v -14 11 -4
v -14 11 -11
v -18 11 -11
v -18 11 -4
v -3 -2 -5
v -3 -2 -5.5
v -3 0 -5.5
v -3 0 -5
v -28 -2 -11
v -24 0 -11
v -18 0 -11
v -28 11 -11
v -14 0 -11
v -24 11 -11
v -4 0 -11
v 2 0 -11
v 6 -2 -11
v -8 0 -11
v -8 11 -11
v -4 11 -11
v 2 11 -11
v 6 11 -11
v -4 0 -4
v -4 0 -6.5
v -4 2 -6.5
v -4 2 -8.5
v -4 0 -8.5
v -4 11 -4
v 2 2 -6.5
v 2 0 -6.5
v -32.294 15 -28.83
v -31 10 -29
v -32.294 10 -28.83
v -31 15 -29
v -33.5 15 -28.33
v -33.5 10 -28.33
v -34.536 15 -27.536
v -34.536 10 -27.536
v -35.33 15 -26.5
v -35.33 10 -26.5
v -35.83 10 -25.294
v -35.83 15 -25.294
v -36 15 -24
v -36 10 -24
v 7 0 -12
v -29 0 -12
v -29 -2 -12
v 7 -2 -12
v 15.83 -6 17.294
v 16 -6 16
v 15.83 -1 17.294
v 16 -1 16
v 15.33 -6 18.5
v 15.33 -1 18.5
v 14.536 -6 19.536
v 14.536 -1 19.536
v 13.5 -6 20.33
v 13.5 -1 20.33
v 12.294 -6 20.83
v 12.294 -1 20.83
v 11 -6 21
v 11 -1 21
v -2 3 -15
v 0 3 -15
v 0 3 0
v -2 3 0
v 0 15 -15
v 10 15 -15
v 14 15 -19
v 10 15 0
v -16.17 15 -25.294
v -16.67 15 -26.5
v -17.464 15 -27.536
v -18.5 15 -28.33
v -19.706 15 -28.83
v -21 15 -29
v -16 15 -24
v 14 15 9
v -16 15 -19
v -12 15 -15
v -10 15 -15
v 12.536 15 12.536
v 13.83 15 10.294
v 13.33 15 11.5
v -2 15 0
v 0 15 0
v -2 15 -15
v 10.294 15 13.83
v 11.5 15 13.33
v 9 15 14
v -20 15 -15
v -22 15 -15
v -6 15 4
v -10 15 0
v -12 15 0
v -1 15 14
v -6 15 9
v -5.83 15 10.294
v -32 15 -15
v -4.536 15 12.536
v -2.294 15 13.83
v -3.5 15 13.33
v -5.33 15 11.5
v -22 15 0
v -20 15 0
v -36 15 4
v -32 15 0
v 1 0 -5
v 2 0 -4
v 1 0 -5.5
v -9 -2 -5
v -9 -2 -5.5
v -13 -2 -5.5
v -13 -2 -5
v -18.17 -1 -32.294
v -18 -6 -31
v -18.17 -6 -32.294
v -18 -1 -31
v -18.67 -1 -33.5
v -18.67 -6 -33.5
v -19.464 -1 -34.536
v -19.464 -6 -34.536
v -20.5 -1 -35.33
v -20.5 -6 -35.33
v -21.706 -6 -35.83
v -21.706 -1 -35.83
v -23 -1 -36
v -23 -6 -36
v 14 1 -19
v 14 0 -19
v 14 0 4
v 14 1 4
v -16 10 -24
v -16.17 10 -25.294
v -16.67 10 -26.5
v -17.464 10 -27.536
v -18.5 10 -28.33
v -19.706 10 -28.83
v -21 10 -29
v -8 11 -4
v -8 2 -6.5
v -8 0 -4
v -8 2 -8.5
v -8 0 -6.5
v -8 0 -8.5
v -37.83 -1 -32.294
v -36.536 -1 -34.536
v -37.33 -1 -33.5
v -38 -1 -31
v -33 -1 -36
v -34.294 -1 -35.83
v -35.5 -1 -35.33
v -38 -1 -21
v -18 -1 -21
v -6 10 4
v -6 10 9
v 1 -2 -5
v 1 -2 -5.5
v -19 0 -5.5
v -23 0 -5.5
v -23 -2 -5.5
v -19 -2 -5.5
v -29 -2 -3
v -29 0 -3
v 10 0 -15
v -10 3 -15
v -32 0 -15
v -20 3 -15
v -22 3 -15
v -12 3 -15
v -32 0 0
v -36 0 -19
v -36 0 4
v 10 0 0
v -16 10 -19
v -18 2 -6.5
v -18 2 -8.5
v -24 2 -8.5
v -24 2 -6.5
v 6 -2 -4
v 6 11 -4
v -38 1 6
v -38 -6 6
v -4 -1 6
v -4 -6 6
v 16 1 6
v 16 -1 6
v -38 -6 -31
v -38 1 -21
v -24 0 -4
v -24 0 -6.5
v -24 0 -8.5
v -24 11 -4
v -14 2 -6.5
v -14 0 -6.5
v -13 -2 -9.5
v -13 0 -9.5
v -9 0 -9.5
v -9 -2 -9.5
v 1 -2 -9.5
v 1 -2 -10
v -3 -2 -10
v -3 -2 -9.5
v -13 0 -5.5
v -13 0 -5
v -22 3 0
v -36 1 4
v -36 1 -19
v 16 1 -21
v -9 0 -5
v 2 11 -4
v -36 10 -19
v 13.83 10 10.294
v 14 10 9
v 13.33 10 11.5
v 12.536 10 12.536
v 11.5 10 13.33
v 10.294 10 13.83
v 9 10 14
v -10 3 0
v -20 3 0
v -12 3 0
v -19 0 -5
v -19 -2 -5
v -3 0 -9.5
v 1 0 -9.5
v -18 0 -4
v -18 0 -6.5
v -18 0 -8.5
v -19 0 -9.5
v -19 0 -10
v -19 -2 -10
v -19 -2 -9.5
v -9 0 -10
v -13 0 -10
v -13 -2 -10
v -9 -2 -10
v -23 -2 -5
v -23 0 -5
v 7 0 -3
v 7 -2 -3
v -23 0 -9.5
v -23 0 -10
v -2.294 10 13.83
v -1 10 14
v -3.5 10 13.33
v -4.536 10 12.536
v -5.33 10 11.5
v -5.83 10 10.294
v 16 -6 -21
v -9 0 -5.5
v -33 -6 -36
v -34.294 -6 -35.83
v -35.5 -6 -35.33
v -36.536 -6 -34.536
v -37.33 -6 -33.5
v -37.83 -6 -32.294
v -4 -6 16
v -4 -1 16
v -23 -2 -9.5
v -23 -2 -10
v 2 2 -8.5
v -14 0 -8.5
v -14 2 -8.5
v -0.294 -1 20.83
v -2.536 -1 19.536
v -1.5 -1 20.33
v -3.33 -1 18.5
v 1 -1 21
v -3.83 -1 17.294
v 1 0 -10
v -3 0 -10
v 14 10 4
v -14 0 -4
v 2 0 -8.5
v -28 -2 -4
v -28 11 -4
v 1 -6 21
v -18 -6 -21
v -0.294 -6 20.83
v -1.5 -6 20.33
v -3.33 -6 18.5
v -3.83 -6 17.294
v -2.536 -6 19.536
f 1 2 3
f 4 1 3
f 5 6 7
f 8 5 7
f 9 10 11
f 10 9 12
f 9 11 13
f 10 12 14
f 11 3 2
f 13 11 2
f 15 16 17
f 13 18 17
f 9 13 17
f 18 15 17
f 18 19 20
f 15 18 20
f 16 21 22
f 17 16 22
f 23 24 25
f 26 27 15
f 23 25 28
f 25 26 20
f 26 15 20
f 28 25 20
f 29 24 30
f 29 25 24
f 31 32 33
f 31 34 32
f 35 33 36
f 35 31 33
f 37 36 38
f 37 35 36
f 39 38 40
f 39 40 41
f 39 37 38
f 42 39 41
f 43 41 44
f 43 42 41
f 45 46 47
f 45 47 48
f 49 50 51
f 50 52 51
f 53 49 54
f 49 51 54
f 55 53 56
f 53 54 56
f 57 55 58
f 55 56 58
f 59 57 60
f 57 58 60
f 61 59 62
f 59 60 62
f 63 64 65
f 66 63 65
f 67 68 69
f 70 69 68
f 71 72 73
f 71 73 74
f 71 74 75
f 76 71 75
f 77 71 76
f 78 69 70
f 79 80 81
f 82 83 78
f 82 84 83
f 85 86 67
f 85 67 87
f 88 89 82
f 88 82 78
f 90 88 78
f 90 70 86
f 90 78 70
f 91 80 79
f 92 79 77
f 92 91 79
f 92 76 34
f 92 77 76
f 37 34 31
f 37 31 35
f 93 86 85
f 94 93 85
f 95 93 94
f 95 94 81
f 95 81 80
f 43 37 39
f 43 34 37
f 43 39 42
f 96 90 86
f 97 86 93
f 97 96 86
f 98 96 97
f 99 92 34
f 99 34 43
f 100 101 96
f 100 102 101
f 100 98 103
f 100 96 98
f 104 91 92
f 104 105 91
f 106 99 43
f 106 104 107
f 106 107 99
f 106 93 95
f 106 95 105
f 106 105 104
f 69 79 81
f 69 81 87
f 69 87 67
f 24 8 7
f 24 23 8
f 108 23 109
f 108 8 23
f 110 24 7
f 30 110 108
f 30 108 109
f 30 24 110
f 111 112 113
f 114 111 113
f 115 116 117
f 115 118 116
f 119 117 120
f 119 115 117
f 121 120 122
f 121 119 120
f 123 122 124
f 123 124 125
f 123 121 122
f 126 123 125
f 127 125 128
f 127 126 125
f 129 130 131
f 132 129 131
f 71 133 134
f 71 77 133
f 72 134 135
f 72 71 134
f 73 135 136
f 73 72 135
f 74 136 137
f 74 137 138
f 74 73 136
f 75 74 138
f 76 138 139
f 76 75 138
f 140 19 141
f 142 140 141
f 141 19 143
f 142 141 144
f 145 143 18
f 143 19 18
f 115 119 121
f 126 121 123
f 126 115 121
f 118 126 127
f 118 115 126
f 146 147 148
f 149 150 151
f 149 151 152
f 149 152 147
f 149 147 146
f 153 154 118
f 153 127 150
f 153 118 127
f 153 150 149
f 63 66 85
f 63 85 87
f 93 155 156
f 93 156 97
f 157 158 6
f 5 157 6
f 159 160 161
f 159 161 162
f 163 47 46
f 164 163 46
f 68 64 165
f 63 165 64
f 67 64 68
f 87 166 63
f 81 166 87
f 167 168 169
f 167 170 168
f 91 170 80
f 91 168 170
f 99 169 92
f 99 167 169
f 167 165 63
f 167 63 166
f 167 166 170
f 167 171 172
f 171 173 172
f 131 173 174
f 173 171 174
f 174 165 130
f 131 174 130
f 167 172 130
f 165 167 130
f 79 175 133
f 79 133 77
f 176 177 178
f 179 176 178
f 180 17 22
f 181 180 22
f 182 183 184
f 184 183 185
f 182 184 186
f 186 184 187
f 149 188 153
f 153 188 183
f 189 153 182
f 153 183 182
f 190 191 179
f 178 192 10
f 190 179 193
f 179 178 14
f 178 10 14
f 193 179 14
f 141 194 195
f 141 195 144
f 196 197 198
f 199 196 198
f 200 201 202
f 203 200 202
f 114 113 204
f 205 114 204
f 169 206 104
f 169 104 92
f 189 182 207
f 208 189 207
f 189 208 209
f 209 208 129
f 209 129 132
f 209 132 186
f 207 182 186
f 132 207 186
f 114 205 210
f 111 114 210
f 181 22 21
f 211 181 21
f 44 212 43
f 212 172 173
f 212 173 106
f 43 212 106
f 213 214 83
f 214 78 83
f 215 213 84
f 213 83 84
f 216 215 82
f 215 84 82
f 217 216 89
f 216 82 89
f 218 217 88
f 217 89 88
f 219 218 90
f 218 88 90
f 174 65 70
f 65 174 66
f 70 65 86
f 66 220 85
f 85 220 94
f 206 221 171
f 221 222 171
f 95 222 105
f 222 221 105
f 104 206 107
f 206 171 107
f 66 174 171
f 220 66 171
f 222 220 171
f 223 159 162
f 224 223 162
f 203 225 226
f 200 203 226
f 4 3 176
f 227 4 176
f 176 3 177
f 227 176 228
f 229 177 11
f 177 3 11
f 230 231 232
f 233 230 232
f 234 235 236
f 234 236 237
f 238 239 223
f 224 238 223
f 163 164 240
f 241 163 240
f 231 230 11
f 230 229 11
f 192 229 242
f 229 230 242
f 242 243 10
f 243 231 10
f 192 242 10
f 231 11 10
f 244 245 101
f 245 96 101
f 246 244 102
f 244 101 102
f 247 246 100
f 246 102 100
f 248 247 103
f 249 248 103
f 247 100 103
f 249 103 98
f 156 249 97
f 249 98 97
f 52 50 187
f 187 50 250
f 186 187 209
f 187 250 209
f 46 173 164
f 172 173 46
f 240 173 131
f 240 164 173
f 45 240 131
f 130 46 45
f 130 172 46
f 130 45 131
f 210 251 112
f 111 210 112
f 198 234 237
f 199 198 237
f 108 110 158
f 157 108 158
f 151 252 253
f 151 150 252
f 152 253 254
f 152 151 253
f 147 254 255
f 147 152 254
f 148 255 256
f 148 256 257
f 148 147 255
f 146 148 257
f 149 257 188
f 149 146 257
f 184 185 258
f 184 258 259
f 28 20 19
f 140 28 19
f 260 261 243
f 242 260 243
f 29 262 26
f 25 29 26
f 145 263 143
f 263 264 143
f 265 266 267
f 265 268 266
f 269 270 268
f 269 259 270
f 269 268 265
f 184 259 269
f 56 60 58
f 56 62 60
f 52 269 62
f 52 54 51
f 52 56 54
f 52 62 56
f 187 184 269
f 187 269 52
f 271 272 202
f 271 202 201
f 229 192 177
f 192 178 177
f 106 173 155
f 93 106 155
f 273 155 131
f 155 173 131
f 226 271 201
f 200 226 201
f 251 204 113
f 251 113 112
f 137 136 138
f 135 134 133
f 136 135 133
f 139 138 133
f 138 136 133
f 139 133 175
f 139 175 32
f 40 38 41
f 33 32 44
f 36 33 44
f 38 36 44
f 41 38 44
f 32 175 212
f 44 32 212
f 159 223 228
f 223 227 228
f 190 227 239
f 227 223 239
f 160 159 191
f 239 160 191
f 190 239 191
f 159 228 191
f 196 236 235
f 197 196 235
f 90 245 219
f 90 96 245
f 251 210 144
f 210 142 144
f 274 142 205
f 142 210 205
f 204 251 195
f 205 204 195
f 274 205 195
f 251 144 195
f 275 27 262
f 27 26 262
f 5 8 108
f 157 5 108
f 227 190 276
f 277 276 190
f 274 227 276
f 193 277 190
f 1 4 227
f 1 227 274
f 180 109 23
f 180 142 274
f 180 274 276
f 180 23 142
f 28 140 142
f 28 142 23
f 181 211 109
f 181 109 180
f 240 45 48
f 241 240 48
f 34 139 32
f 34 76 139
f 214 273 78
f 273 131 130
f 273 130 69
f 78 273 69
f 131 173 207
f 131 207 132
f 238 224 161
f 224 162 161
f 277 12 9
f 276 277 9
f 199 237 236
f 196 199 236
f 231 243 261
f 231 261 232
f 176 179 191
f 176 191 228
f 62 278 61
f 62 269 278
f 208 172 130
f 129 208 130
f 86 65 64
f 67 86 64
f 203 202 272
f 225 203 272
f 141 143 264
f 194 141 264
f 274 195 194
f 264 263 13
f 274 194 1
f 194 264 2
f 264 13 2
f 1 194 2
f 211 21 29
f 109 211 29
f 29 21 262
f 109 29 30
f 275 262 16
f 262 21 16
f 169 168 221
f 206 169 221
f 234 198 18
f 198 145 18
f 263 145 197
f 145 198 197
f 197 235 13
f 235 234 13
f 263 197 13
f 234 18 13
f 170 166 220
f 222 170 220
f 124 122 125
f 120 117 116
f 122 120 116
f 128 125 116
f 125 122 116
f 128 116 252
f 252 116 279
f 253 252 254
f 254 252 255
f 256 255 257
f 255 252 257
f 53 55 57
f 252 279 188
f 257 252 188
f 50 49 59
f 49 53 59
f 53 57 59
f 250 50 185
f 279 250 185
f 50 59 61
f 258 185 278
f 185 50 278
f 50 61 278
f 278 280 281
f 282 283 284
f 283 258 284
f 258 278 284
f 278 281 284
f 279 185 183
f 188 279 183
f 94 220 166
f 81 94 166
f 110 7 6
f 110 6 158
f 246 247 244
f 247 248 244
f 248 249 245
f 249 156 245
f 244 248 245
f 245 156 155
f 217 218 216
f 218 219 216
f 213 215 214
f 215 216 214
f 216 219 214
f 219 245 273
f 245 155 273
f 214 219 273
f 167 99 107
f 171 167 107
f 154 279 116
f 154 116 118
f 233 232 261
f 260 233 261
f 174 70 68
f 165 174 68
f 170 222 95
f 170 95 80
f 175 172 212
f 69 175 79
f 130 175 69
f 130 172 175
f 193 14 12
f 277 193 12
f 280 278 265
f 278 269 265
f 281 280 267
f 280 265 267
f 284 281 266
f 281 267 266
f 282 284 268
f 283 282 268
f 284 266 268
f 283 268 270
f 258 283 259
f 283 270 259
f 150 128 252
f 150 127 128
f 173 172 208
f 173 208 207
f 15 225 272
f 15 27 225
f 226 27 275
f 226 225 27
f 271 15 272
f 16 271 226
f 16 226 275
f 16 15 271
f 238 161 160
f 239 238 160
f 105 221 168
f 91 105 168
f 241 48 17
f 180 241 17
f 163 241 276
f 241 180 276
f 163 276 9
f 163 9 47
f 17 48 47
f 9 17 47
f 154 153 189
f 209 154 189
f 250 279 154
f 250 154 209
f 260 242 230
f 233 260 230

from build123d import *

# Parameters (mm, degrees)
SKETCH1_W                = 8
SKETCH1_H                = 15
BOSS_EXTRUDE1_DEPTH      = 15
SKETCH2_W                = 4
SKETCH2_H                = 7
CUT_EXTRUDE1_DEPTH       = 11
SKETCH3_W                = 15
SKETCH3_H                = 3
BOSS_EXTRUDE2_DEPTH      = 2
LPATTERN1_COUNT          = 4
LPATTERN1_PITCH          = 10
SKETCH4_W                = 15
SKETCH4_H                = 12
BOSS_EXTRUDE3_DEPTH      = 2
SKETCH5_W                = 15
SKETCH5_H                = 15
BOSS_EXTRUDE4_DEPTH      = 2
SKETCH6_W                = 34
SKETCH6_H                = 2
CUT_EXTRUDE2_DEPTH       = 2
SKETCH7_W                = 36
SKETCH7_H                = 9
SKETCH7_W_2              = 34
SKETCH7_H_2              = 7
BOSS_EXTRUDE5_DEPTH      = 2
SKETCH8_W                = 4
SKETCH8_H                = 0.5
BOSS_EXTRUDE6_DEPTH      = 2
LPATTERN2_COUNT          = 3
LPATTERN2_PITCH          = 10
BOSS_EXTRUDE7_DEPTH      = 15
BOSS_EXTRUDE7_DEPTH_BACK = 6
SKETCH9_W                = 50
SKETCH9_H                = 23
SPLIT1_START             = -6
SPLIT1_OUTLINE_W         = 50
SPLIT1_OUTLINE_H         = 23
SPLIT1_DEPTH             = 6
SPLIT1_2_OUTLINE_W       = 4
SPLIT1_2_OUTLINE_H       = 7
SPLIT1_2_DEPTH           = 11
SPLIT1_3_OUTLINE_W       = 6
SPLIT1_3_OUTLINE_H       = 2
SPLIT1_3_DEPTH           = 2
SPLIT1_START_2           = -19
SPLIT1_4_DEPTH           = 23
SPLIT1_START_3           = -11
SPLIT1_5_DEPTH           = 7
SPLIT1_6_OUTLINE_W       = 36
SPLIT1_6_OUTLINE_H       = 2
SPLIT1_6_DEPTH           = 7
SPLIT1_START_4           = -3
SPLIT1_7_OUTLINE_W       = 36
SPLIT1_7_OUTLINE_H       = 2
SPLIT1_7_DEPTH           = 7
SPLIT1_START_5           = -8.5
SPLIT1_8_DEPTH           = 2
SPLIT1_START_6           = -9.5
SPLIT1_9_OUTLINE_W       = 4
SPLIT1_9_OUTLINE_H       = 2
SPLIT1_9_DEPTH           = 4
SPLIT1_10_OUTLINE_W      = 4
SPLIT1_10_OUTLINE_H      = 2
SPLIT1_10_DEPTH          = 1
SPLIT1_START_7           = -5
SPLIT1_11_OUTLINE_W      = 4
SPLIT1_11_OUTLINE_H      = 2
SPLIT1_11_DEPTH          = 1
SKETCH11_W               = 20
SKETCH11_H               = 5
BOSS_EXTRUDE8_DEPTH      = 10
SKETCH12_W               = 20
SKETCH12_H               = 5
BOSS_EXTRUDE9_DEPTH      = 10
FILLET1_R                = 5
SKETCH13_W               = 54
SKETCH13_H               = 27
SKETCH13_W_2             = 50
SKETCH13_H_2             = 23
BOSS_EXTRUDE11_DEPTH     = 7
SKETCH14_W               = 20
SKETCH14_H               = 5
BOSS_EXTRUDE12_DEPTH     = 15
SKETCH15_W               = 20
SKETCH15_H               = 5
BOSS_EXTRUDE13_DEPTH     = 15
FILLET2_R                = 5


# Read off the part's stored shape, not the designer's step: Split1
with BuildPart() as part:
    # Sketch1 → Boss-Extrude1 (new body)
    with BuildSketch(Plane(origin=(0, 0, 0), x_dir=(1, 0, 0), z_dir=(0, 1, 0))):
        with Locations((4, 7.5)):
            Rectangle(SKETCH1_W, SKETCH1_H)
    extrude(amount=BOSS_EXTRUDE1_DEPTH)

    # Sketch2 → Cut-Extrude1 (cut)
    with BuildSketch(Plane.XZ):
        with Locations((4, -7.5)):
            Rectangle(SKETCH2_W, SKETCH2_H)
    extrude(amount=-CUT_EXTRUDE1_DEPTH, mode=Mode.SUBTRACT)

    # Sketch3 → Boss-Extrude2 (add)
    with BuildSketch(Plane.ZY):
        with Locations((-7.5, 1.5)):
            Rectangle(SKETCH3_W, SKETCH3_H)
    extrude(amount=BOSS_EXTRUDE2_DEPTH)


with BuildPart() as lpattern1_1:
    # LPattern1: pattern copy
    add(part.part.moved(Location(Vector(-1, 0, 0) * (1 * LPATTERN1_PITCH))))


with BuildPart() as lpattern1_2:
    # LPattern1: pattern copy
    add(part.part.moved(Location(Vector(-1, 0, 0) * (2 * LPATTERN1_PITCH))))


with BuildPart() as lpattern1_3:
    # LPattern1: pattern copy
    add(part.part.moved(Location(Vector(-1, 0, 0) * (3 * LPATTERN1_PITCH))))


with BuildPart() as lpattern1_2_1:
    add(lpattern1_2.part)

    # Combine1: union LPattern1_1, part, LPattern1_3
    add(lpattern1_1.part)
    add(part.part)
    add(lpattern1_3.part)

    # Sketch4 → Boss-Extrude3 (add)
    with BuildSketch(Plane.ZY.offset(30)):
        with Locations((-7.5, 9)):
            Rectangle(SKETCH4_W, SKETCH4_H)
    extrude(amount=BOSS_EXTRUDE3_DEPTH)

    # Sketch5 → Boss-Extrude4 (add)
    with BuildSketch(Plane(origin=(8, 0, 0), x_dir=(0, 0, -1), z_dir=(1, 0, 0))):
        with Locations((7.5, 7.5)):
            Rectangle(SKETCH5_W, SKETCH5_H)
    extrude(amount=BOSS_EXTRUDE4_DEPTH)

    # Sketch6 → Cut-Extrude2 (cut)
    with BuildSketch(Plane(origin=(0, 0, 0), x_dir=(-1, 0, 0), z_dir=(0, -1, 0))):
        with Locations((11, 7.5)):
            Rectangle(SKETCH6_W, SKETCH6_H)
    extrude(amount=-CUT_EXTRUDE2_DEPTH, mode=Mode.SUBTRACT)

    # Sketch7 → Boss-Extrude5 (add)
    with BuildSketch(Plane.XZ):
        with Locations((-11, -7.5)):
            Rectangle(SKETCH7_W, SKETCH7_H)
        with Locations((-11, -7.5)):
            Rectangle(SKETCH7_W_2, SKETCH7_H_2, mode=Mode.SUBTRACT)
    extrude(amount=BOSS_EXTRUDE5_DEPTH)

    # Sketch8 → Boss-Extrude6 (add)
    with BuildSketch(Plane.XZ):
        with Locations((-21, -9.75)):
            Rectangle(SKETCH8_W, SKETCH8_H)
        with Locations((-21, -5.25)):
            Rectangle(SKETCH8_W, SKETCH8_H)
    boss_extrude6 = extrude(amount=BOSS_EXTRUDE6_DEPTH)

    # LPattern2: Boss-Extrude6 ×3
    with Locations(*[(i * LPATTERN2_PITCH, 0, 0) for i in range(1, LPATTERN2_COUNT)]):
        add(boss_extrude6)


with BuildPart() as body_2:
    # Sketch9 → Boss-Extrude7 (new, two sides: drawn at the far end of the back side and taken through both)
    with BuildSketch(Plane(origin=(0, 0, 0), x_dir=(1, 0, 0), z_dir=(0, 1, 0)).offset(-BOSS_EXTRUDE7_DEPTH_BACK)):
        with Locations((-11, 7.5)):
            Rectangle(SKETCH9_W, SKETCH9_H)
    extrude(amount=BOSS_EXTRUDE7_DEPTH + BOSS_EXTRUDE7_DEPTH_BACK)

    # Combine2: cut LPattern1_2
    add(lpattern1_2_1.part, mode=Mode.SUBTRACT)

    # Split1 outline → Split1 (cut)
    with BuildSketch(Plane(origin=(0, 0, 0), x_dir=(1, 0, 0), z_dir=(0, 1, 0)).offset(SPLIT1_START)):
        with Locations((-11, 7.5)):
            Rectangle(SPLIT1_OUTLINE_W, SPLIT1_OUTLINE_H)
    extrude(amount=SPLIT1_DEPTH, mode=Mode.SUBTRACT)

    # Split1 2 outline → Split1 2 (cut)
    with BuildSketch(Plane(origin=(0, 0, 0), x_dir=(1, 0, 0), z_dir=(0, 1, 0))):
        with Locations((-26, 7.5)):
            Rectangle(SPLIT1_2_OUTLINE_W, SPLIT1_2_OUTLINE_H)
        with Locations((-16, 7.5)):
            Rectangle(SPLIT1_2_OUTLINE_W, SPLIT1_2_OUTLINE_H)
        with Locations((-6, 7.5)):
            Rectangle(SPLIT1_2_OUTLINE_W, SPLIT1_2_OUTLINE_H)
        with Locations((4, 7.5)):
            Rectangle(SPLIT1_2_OUTLINE_W, SPLIT1_2_OUTLINE_H)
    extrude(amount=SPLIT1_2_DEPTH, mode=Mode.SUBTRACT)

    # Split1 3 outline → Split1 3 (cut)
    with BuildSketch(Plane(origin=(0, 0, 0), x_dir=(1, 0, 0), z_dir=(0, 1, 0))):
        with Locations((-21, 7.5)):
            Rectangle(SPLIT1_3_OUTLINE_W, SPLIT1_3_OUTLINE_H)
        with Locations((-11, 7.5)):
            Rectangle(SPLIT1_3_OUTLINE_W, SPLIT1_3_OUTLINE_H)
        with Locations((-1, 7.5)):
            Rectangle(SPLIT1_3_OUTLINE_W, SPLIT1_3_OUTLINE_H)
    extrude(amount=SPLIT1_3_DEPTH, mode=Mode.SUBTRACT)

    # Sketch11 → Boss-Extrude8 (add)
    with BuildSketch(Plane.XY.offset(4)):
        with Locations((4, 12.5)):
            Rectangle(SKETCH11_W, SKETCH11_H)
    extrude(amount=BOSS_EXTRUDE8_DEPTH)

    # Sketch12 → Boss-Extrude9 (add)
    with BuildSketch(Plane(origin=(0, 0, -19), x_dir=(-1, 0, 0), z_dir=(0, 0, -1))):
        with Locations((26, 12.5)):
            Rectangle(SKETCH12_W, SKETCH12_H)
    extrude(amount=BOSS_EXTRUDE9_DEPTH)

    # Fillet1
    fillet1_edges = [body_2.edges().sort_by_distance(p)[0] for p in [
        (-6, 12.5, 14),
        (14, 12.5, 14),
        (-36, 12.5, -29),
        (-16, 12.5, -29),
    ]]
    fillet(fillet1_edges, radius=FILLET1_R)


with BuildPart() as body_2_2:
    # Split1 4 outline → Split1 4 (new body)
    with BuildSketch(Plane.XY.offset(SPLIT1_START_2)):
        Polygon((7, -2), (-29, -2), (-29, 0), (-36, 0), (-36, -6), (14, -6), (14, 0), (7, 0), align=None)
    extrude(amount=SPLIT1_4_DEPTH)

    # Split1 5 outline → Split1 5 (add)
    with BuildSketch(Plane.XY.offset(SPLIT1_START_3)):
        Polygon((2, 11), (2, 0), (1, 0), (1, -2), (6, -2), (6, 11), align=None)
        Polygon((-4, 0), (-4, 11), (-8, 11), (-8, 0), (-9, 0), (-9, -2), (-3, -2), (-3, 0), align=None)
        Polygon((-14, 0), (-14, 11), (-18, 11), (-18, 0), (-19, 0), (-19, -2), (-13, -2), (-13, 0), align=None)
        Polygon((-28, -2), (-23, -2), (-23, 0), (-24, 0), (-24, 11), (-28, 11), align=None)
    extrude(amount=SPLIT1_5_DEPTH)

    # Split1 6 outline → Split1 6 (add)
    with BuildSketch(Plane.XY.offset(SPLIT1_START_2)):
        with Locations((-11, -1)):
            Rectangle(SPLIT1_6_OUTLINE_W, SPLIT1_6_OUTLINE_H)
    extrude(amount=SPLIT1_6_DEPTH)

    # Split1 7 outline → Split1 7 (add)
    with BuildSketch(Plane.XY.offset(SPLIT1_START_4)):
        with Locations((-11, -1)):
            Rectangle(SPLIT1_7_OUTLINE_W, SPLIT1_7_OUTLINE_H)
    extrude(amount=SPLIT1_7_DEPTH)

    # Split1 8 outline → Split1 8 (add)
    with BuildSketch(Plane.XY.offset(SPLIT1_START_5)):
        Polygon((2, 0), (2, 2), (-4, 2), (-4, 0), (-3, 0), (-3, -2), (1, -2), (1, 0), align=None)
        Polygon((-9, 0), (-8, 0), (-8, 2), (-14, 2), (-14, 0), (-13, 0), (-13, -2), (-9, -2), align=None)
        Polygon((-23, -2), (-19, -2), (-19, 0), (-18, 0), (-18, 2), (-24, 2), (-24, 0), (-23, 0), align=None)
    extrude(amount=SPLIT1_8_DEPTH)

    # Split1 9 outline → Split1 9 (add)
    with BuildSketch(Plane.XY.offset(SPLIT1_START_6)):
        with Locations((-1, -1)):
            Rectangle(SPLIT1_9_OUTLINE_W, SPLIT1_9_OUTLINE_H)
        with Locations((-11, -1)):
            Rectangle(SPLIT1_9_OUTLINE_W, SPLIT1_9_OUTLINE_H)
        with Locations((-21, -1)):
            Rectangle(SPLIT1_9_OUTLINE_W, SPLIT1_9_OUTLINE_H)
    extrude(amount=SPLIT1_9_DEPTH)

    # Split1 10 outline → Split1 10 (add)
    with BuildSketch(Plane.XY.offset(SPLIT1_START_3)):
        with Locations((-1, -1)):
            Rectangle(SPLIT1_10_OUTLINE_W, SPLIT1_10_OUTLINE_H)
        with Locations((-11, -1)):
            Rectangle(SPLIT1_10_OUTLINE_W, SPLIT1_10_OUTLINE_H)
        with Locations((-21, -1)):
            Rectangle(SPLIT1_10_OUTLINE_W, SPLIT1_10_OUTLINE_H)
    extrude(amount=SPLIT1_10_DEPTH)

    # Split1 11 outline → Split1 11 (add)
    with BuildSketch(Plane.XY.offset(SPLIT1_START_7)):
        with Locations((-1, -1)):
            Rectangle(SPLIT1_11_OUTLINE_W, SPLIT1_11_OUTLINE_H)
        with Locations((-11, -1)):
            Rectangle(SPLIT1_11_OUTLINE_W, SPLIT1_11_OUTLINE_H)
        with Locations((-21, -1)):
            Rectangle(SPLIT1_11_OUTLINE_W, SPLIT1_11_OUTLINE_H)
    extrude(amount=SPLIT1_11_DEPTH)

    # Sketch13 → Boss-Extrude11 (add)
    with BuildSketch(Plane.XZ.offset(6)):
        with Locations((-11, -7.5)):
            Rectangle(SKETCH13_W, SKETCH13_H)
        with Locations((-11, -7.5)):
            Rectangle(SKETCH13_W_2, SKETCH13_H_2, mode=Mode.SUBTRACT)
    extrude(amount=-BOSS_EXTRUDE11_DEPTH)

    # Sketch14 → Boss-Extrude12 (add)
    with BuildSketch(Plane.XY.offset(6)):
        with Locations((6, -3.5)):
            Rectangle(SKETCH14_W, SKETCH14_H)
    extrude(amount=BOSS_EXTRUDE12_DEPTH)

    # Sketch15 → Boss-Extrude13 (add)
    with BuildSketch(Plane(origin=(0, 0, -21), x_dir=(-1, 0, 0), z_dir=(0, 0, -1))):
        with Locations((28, -3.5)):
            Rectangle(SKETCH15_W, SKETCH15_H)
    extrude(amount=BOSS_EXTRUDE13_DEPTH)

    # Fillet2
    fillet2_edges = [body_2_2.edges().sort_by_distance(p)[0] for p in [
        (16, -3.5, 21),
        (-4, -3.5, 21),
        (-38, -3.5, -36),
        (-18, -3.5, -36),
    ]]
    fillet(fillet2_edges, radius=FILLET2_R)


solid = Compound([body_2.part, body_2_2.part])
